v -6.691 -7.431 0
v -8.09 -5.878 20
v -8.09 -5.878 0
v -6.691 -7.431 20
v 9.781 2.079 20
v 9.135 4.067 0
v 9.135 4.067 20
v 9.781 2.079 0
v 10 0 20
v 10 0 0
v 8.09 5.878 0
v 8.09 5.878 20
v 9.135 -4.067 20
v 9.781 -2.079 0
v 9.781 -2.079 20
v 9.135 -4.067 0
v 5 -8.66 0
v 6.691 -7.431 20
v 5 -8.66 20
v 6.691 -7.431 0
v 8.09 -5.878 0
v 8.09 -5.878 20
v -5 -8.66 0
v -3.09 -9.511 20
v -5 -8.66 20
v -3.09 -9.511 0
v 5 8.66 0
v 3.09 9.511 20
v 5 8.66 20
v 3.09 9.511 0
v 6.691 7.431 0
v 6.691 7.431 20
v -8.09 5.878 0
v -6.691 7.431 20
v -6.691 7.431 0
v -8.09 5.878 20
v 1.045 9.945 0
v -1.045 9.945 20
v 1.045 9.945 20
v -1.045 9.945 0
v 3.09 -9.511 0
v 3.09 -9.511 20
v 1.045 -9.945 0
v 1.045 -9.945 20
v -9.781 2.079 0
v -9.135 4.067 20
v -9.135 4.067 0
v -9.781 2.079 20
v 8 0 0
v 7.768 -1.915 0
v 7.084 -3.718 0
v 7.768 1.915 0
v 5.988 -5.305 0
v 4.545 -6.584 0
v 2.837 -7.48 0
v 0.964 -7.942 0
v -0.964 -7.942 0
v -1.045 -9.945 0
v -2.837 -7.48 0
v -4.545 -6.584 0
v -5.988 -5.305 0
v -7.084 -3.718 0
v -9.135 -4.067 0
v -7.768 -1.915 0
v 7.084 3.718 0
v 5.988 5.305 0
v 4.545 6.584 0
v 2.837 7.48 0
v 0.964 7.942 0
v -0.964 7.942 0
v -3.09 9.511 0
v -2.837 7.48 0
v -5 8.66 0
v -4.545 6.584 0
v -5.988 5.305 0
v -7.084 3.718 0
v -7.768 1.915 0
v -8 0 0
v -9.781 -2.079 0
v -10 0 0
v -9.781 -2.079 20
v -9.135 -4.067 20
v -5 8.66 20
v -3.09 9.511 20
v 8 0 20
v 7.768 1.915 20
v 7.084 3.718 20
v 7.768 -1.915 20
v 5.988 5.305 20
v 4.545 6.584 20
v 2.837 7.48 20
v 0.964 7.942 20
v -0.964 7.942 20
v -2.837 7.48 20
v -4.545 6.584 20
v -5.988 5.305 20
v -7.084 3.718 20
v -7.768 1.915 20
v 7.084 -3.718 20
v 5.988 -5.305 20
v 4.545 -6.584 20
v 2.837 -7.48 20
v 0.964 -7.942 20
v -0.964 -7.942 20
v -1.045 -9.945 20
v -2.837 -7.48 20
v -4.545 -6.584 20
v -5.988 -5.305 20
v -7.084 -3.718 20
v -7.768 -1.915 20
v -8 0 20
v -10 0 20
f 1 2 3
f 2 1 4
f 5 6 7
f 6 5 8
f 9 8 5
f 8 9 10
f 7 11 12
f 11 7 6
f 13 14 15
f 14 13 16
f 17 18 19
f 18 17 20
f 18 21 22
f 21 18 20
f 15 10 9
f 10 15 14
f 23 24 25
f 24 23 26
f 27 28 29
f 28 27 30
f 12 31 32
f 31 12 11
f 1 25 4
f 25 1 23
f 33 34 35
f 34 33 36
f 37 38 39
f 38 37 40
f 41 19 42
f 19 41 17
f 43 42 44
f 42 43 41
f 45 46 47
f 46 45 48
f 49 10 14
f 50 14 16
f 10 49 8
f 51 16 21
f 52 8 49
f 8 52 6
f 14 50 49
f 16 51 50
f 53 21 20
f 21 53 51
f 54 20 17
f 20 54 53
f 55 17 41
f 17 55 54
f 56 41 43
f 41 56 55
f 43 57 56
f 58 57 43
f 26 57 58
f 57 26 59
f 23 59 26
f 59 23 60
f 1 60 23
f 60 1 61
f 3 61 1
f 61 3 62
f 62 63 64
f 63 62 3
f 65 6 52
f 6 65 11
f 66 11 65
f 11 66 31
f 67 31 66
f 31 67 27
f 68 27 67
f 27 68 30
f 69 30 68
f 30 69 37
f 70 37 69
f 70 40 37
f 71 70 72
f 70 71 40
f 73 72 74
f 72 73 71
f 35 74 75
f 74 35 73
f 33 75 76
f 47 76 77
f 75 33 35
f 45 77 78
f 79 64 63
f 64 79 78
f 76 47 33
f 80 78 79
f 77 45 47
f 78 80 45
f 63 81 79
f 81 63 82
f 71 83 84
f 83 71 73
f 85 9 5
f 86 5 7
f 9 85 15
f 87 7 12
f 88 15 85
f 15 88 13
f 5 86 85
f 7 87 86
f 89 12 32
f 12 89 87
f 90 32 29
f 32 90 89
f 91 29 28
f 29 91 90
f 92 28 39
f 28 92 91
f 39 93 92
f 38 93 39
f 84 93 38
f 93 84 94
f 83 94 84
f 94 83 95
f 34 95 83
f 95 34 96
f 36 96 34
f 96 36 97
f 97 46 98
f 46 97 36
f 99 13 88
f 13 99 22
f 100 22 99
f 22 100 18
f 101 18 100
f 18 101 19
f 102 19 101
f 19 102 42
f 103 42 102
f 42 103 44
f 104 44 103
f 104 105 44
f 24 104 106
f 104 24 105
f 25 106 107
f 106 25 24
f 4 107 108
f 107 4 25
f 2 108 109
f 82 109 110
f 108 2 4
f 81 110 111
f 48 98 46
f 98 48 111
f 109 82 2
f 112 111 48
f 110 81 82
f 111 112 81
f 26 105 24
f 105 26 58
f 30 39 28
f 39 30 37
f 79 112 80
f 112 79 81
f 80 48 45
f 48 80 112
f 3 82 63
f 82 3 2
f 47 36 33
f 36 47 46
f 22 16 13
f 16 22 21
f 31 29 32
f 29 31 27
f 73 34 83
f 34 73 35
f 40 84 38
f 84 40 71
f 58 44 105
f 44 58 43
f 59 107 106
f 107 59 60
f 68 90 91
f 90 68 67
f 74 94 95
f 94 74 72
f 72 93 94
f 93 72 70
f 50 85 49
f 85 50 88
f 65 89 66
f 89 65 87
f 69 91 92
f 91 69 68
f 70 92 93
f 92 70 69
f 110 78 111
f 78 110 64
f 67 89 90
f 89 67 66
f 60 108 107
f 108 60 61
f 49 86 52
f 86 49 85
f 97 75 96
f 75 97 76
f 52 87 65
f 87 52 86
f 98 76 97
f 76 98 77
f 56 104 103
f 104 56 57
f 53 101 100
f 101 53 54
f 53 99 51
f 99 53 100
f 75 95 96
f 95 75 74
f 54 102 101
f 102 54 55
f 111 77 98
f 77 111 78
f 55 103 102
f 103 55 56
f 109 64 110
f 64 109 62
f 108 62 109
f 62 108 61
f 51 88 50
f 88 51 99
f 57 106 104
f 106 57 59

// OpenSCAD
// A simple hollow cylinder demo
wall_thickness = 2;  // mm
height = 20;         // mm
radius = 10;         // mm

module cylinder_shell(r, h, wall) {
    difference() {
        cylinder(r=r, h=h);
        translate([0, 0, -1])
            cylinder(r=r - wall, h=h + 2);
    }
}

cylinder_shell(radius, height, wall_thickness);
